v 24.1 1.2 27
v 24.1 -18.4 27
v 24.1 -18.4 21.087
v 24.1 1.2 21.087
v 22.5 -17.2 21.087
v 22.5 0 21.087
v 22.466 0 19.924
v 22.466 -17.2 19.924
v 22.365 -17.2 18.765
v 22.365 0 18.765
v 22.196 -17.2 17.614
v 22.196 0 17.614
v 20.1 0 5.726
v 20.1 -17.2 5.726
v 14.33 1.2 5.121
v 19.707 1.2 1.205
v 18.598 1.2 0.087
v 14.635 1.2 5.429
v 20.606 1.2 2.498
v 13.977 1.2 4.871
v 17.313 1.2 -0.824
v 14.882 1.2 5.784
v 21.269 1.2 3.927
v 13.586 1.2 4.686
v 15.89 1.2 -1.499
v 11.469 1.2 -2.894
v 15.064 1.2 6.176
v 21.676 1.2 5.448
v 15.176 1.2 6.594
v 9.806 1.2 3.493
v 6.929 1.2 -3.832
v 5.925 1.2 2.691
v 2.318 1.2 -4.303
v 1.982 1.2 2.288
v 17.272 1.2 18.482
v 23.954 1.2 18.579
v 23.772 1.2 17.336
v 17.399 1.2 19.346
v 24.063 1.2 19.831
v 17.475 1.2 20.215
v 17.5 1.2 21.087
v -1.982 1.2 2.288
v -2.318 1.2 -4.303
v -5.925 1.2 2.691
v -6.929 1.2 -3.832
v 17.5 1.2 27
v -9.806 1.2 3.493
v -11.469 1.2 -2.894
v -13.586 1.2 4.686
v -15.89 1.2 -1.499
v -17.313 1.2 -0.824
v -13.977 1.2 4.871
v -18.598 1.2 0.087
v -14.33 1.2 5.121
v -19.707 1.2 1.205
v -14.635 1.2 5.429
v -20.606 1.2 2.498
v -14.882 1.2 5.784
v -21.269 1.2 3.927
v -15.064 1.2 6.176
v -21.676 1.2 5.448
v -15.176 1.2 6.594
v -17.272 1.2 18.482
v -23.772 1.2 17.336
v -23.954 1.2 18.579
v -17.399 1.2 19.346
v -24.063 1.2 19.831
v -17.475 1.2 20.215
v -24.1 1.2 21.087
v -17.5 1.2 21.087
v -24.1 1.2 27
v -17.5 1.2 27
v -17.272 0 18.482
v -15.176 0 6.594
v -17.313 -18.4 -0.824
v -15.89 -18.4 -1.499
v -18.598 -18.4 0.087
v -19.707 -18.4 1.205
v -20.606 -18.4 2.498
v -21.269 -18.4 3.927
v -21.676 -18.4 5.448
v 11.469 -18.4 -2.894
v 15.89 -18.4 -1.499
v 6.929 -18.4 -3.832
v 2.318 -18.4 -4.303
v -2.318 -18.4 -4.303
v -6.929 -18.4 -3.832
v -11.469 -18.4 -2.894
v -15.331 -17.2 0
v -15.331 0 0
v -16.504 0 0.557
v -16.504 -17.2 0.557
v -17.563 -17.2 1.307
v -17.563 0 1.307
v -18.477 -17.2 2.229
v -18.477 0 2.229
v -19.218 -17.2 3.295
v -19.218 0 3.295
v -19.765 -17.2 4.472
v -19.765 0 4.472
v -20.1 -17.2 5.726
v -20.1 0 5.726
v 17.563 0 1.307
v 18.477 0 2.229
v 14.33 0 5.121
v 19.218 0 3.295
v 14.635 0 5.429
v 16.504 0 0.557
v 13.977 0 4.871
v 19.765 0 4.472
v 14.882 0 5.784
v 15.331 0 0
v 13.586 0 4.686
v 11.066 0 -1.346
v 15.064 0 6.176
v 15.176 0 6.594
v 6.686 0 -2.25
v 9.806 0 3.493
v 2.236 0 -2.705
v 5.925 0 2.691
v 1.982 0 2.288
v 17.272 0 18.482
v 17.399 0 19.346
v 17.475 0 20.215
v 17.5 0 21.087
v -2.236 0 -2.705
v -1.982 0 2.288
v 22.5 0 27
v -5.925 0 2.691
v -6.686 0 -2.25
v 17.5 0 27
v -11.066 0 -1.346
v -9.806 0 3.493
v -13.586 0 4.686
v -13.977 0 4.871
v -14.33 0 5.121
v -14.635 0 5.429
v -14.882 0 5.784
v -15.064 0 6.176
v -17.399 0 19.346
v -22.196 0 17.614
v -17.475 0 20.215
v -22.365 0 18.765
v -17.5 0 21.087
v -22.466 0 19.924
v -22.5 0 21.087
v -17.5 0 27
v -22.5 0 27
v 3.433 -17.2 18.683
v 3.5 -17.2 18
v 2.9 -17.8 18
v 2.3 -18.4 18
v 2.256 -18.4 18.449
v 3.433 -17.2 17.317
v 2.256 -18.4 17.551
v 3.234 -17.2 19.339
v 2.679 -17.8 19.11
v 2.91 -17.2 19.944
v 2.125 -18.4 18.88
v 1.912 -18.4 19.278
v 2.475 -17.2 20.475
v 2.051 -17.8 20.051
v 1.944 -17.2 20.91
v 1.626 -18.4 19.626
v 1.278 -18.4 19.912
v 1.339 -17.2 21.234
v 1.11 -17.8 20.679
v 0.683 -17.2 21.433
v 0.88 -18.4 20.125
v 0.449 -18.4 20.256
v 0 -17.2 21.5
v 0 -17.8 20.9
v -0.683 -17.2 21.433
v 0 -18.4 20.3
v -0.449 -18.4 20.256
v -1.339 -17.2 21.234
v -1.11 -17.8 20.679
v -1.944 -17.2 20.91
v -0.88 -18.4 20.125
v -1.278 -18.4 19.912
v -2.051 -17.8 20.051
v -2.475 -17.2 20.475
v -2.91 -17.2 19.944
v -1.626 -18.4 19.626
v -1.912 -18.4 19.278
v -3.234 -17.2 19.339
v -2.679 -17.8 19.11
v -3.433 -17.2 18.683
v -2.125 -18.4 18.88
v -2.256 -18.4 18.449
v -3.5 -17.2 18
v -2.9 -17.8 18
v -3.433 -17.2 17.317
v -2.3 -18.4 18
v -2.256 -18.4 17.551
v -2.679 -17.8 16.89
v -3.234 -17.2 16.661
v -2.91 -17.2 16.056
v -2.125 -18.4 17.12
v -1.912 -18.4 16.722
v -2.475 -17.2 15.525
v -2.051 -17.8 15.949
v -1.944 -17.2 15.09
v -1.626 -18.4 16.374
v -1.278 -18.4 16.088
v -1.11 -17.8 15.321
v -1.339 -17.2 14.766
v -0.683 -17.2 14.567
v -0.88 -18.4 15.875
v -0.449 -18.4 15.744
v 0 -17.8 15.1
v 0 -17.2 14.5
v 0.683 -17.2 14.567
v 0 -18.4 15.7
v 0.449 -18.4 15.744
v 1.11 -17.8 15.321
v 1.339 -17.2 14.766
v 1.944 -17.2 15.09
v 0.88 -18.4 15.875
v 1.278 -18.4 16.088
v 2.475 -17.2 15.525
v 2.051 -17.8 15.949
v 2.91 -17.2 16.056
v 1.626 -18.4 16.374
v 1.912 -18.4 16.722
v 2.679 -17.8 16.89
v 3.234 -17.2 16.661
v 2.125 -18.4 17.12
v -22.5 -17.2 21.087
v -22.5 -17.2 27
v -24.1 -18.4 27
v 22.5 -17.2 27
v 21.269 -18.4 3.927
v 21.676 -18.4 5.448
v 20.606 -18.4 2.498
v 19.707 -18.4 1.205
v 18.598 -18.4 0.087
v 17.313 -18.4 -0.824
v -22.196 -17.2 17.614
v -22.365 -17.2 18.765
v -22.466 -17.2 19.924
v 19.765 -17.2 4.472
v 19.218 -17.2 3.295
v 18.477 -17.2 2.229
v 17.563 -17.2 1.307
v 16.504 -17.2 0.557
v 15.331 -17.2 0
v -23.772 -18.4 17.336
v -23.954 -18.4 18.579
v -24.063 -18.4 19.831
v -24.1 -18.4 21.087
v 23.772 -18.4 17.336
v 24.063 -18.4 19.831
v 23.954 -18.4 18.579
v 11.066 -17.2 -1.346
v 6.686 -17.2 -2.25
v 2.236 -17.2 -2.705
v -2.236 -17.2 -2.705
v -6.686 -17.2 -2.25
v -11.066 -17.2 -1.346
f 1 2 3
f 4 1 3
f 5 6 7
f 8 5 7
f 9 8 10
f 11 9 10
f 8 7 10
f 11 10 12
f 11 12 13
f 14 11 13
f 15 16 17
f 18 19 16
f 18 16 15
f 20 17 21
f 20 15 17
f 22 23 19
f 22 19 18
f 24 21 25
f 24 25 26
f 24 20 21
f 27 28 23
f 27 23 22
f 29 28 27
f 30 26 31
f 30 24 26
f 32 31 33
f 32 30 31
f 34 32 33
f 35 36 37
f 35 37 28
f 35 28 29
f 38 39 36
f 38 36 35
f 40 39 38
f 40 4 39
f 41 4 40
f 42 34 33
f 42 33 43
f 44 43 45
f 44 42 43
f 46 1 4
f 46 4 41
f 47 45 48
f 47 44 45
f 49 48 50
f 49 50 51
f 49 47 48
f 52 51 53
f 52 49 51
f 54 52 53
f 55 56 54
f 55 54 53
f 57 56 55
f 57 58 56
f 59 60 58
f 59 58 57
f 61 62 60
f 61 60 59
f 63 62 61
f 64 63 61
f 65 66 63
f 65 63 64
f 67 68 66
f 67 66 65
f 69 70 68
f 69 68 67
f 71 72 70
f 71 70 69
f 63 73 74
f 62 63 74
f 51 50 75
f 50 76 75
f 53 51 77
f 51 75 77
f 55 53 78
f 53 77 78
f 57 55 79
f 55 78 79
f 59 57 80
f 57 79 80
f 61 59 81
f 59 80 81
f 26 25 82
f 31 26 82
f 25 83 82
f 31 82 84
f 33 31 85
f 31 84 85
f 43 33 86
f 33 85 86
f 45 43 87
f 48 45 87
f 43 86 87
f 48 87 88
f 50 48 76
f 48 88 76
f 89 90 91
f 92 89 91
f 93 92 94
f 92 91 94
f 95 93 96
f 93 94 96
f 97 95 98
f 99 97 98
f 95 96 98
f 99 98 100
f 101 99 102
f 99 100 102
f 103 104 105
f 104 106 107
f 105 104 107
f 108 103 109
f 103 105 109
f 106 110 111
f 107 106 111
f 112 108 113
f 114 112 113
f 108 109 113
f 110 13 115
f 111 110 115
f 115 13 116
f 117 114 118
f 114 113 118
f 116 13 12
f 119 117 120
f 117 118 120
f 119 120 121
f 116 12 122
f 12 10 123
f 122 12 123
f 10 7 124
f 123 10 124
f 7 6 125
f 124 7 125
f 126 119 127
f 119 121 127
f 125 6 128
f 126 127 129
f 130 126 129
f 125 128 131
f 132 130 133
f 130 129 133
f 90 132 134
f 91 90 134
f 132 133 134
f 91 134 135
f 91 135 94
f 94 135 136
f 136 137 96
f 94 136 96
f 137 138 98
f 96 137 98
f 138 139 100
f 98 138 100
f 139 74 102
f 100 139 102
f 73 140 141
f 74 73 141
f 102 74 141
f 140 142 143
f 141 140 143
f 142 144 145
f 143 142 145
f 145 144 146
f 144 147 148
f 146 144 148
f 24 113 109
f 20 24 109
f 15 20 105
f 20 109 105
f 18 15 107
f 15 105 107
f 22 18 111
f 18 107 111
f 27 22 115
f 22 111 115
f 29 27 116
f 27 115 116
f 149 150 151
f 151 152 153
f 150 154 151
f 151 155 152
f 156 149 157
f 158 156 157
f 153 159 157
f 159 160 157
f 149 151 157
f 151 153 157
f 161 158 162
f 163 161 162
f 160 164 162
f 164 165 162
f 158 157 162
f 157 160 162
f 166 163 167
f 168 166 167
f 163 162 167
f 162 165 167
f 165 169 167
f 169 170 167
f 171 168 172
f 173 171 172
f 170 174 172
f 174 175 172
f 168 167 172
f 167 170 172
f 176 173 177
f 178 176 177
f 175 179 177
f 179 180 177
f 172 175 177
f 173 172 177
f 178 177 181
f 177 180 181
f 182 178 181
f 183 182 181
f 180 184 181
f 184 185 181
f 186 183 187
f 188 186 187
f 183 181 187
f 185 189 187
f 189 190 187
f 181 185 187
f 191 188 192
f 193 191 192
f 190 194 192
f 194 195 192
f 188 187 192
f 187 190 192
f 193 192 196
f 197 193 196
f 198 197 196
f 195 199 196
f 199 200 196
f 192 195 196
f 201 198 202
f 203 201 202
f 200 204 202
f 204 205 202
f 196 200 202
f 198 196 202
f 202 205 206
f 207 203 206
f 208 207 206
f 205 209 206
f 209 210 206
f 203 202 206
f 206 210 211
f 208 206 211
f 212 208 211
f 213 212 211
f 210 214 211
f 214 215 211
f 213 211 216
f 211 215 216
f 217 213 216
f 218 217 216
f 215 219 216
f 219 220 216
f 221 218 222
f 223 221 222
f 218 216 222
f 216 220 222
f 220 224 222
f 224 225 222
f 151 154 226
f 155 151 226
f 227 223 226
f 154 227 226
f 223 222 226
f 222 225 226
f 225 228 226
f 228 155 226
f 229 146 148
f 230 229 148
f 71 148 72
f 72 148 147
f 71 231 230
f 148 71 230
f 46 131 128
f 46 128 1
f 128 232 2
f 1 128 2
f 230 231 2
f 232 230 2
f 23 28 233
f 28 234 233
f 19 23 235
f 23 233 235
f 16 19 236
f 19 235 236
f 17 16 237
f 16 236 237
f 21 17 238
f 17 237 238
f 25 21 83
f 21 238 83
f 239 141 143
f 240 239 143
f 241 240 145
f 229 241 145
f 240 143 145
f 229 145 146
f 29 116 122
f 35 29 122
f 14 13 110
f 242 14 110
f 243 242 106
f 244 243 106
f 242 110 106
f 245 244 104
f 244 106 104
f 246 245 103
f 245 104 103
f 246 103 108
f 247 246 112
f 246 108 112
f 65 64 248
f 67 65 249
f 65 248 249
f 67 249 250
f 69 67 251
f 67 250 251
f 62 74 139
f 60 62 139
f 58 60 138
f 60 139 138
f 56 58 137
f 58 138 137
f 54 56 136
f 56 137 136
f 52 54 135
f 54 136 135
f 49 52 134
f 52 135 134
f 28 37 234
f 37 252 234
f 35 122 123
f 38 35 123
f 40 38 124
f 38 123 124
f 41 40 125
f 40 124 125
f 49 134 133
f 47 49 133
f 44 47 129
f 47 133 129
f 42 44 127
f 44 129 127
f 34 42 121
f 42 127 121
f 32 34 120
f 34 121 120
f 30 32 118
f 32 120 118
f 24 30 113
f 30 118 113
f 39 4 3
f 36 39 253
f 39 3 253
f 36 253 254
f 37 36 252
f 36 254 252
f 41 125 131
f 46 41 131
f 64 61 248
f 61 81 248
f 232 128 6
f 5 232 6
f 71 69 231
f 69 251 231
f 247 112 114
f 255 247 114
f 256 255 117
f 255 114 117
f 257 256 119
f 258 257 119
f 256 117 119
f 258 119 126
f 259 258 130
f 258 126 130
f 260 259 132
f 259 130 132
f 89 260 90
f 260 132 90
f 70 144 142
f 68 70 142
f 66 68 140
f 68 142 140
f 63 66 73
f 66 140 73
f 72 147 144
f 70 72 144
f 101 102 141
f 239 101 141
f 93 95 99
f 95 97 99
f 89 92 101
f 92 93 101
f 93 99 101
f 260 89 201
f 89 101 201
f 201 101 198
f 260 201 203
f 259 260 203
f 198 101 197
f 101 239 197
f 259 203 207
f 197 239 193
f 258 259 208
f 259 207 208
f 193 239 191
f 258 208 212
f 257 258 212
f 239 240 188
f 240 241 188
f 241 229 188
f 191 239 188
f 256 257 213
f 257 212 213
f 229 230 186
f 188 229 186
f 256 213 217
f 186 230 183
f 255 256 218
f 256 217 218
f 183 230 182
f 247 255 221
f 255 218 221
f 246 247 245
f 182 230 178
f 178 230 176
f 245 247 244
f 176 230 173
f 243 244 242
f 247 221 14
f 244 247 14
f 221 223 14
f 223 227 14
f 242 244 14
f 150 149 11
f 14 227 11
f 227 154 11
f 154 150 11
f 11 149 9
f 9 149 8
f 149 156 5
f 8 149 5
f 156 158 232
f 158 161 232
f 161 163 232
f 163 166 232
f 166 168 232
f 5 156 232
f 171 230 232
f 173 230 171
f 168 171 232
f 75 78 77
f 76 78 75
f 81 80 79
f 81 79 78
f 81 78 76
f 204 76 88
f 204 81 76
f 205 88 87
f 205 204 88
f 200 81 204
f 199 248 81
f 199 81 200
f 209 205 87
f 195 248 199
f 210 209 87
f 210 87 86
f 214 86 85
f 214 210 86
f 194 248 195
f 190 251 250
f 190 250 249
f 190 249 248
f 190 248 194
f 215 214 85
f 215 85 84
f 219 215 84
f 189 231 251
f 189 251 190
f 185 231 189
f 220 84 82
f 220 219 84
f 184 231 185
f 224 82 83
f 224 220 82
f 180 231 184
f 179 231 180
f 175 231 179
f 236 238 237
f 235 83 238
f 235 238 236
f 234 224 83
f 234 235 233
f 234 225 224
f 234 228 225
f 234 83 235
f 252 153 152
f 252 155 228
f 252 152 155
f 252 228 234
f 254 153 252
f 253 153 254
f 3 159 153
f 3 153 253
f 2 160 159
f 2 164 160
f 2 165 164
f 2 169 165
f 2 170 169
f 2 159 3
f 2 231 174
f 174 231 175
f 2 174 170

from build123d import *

# Parameters (mm, degrees)
F1_DEPTH = 17.2
F2_R     = 1.5
F3_DEPTH = 1.2
F5_DEPTH = 1.2


# Not quite as in the source:
# - a fillet or chamfer that OpenCascade refuses, or shapes differently, is made with other operations: its cross-section is extruded or revolved along the edge and cut away or added


with BuildPart() as f1:
    # F0 (on Front) → F1 (new body)
    with BuildSketch(Plane.XZ):
        with BuildLine():
            Line((-20.1, 5.7260450742), (-22.1961550602, 17.6139311585))
            ThreePointArc((-22.1961550602, 17.6139311585), (-22.4238939618, 19.3437798569), (-22.5, 21.0868947118))
            Line((-22.5, 21.0868947118), (-22.5, 27))
            Line((-22.5, 27), (-24.1, 27))
            Line((-24.1, 27), (-24.1, 21.0868947118))
            ThreePointArc((-24.1, 21.0868947118), (-24.0178054788, 19.2043306685), (-23.7718474651, 17.3360940742))
            Line((-23.7718474651, 17.3360940742), (-21.6756924048, 5.44820799))
            ThreePointArc((-21.6756924048, 5.44820799), (-19.7066672631, 1.205023255), (-15.889887542, -1.4993933668))
            ThreePointArc((-15.889887542, -1.4993933668), (0, -4.3622248316), (15.889887542, -1.4993933668))
            ThreePointArc((15.889887542, -1.4993933668), (19.7066672631, 1.205023255), (21.6756924048, 5.44820799))
            Line((21.6756924048, 5.44820799), (23.7718474651, 17.3360940742))
            ThreePointArc((23.7718474651, 17.3360940742), (24.0178054788, 19.2043306685), (24.1, 21.0868947118))
            Line((24.1, 21.0868947118), (24.1, 27))
            Line((24.1, 27), (22.5, 27))
            Line((22.5, 27), (22.5, 21.0868947118))
            ThreePointArc((22.5, 21.0868947118), (22.4238939618, 19.3437798569), (22.1961550602, 17.6139311585))
            Line((22.1961550602, 17.6139311585), (20.1, 5.7260450742))
            ThreePointArc((20.1, 5.7260450742), (18.477177081, 2.2289147982), (15.3314795087, 0))
            ThreePointArc((15.3314795087, 0), (0, -2.7622248316), (-15.3314795087, 0))
            ThreePointArc((-15.3314795087, 0), (-18.477177081, 2.2289147982), (-20.1, 5.7260450742))
        make_face()
    extrude(amount=F1_DEPTH)

    # F2 (on face) → F3 (join)
    with BuildSketch(Plane.XZ.offset(17.2)):
        with BuildLine():
            Line((24.1, 27), (-24.1, 27))
            Line((-24.1, 27), (-24.1, 21.0868947118))
            ThreePointArc((-24.1, 21.0868947118), (-24.0178054788, 19.2043306685), (-23.7718474651, 17.3360940742))
            Line((-23.7718474651, 17.3360940742), (-21.6756924048, 5.44820799))
            ThreePointArc((-21.6756924048, 5.44820799), (-19.7066672631, 1.205023255), (-15.889887542, -1.4993933668))
            ThreePointArc((-15.889887542, -1.4993933668), (0, -4.3622248316), (15.889887542, -1.4993933668))
            ThreePointArc((15.889887542, -1.4993933668), (19.7066672631, 1.205023255), (21.6756924048, 5.44820799))
            Line((21.6756924048, 5.44820799), (23.7718474651, 17.3360940742))
            ThreePointArc((23.7718474651, 17.3360940742), (24.0178054788, 19.2043306685), (24.1, 21.0868947118))
            Line((24.1, 21.0868947118), (24.1, 27))
        make_face()
        with Locations((0, 18)):
            Circle(F2_R, mode=Mode.SUBTRACT)
    extrude(amount=F3_DEPTH)

    # F4 (on face) → F5 (join)
    with BuildSketch(Plane(origin=(0, 0, 0), x_dir=(-1, 0, 0), z_dir=(0, 1, 0))):
        with BuildLine():
            Line((-24.1, 27), (-24.1, 21.0868947118))
            ThreePointArc((-24.1, 21.0868947118), (-24.0178054788, 19.2043306685), (-23.7718474651, 17.3360940742))
            Line((-23.7718474651, 17.3360940742), (-21.6756924048, 5.44820799))
            ThreePointArc((-21.6756924048, 5.44820799), (-19.7066672631, 1.205023255), (-15.889887542, -1.4993933668))
            ThreePointArc((-15.889887542, -1.4993933668), (0, -4.3622248316), (15.889887542, -1.4993933668))
            ThreePointArc((15.889887542, -1.4993933668), (19.7066672631, 1.205023255), (21.6756924048, 5.44820799))
            Line((21.6756924048, 5.44820799), (23.7718474651, 17.3360940742))
            ThreePointArc((23.7718474651, 17.3360940742), (24.0178054788, 19.2043306685), (24.1, 21.0868947118))
            Line((24.1, 21.0868947118), (24.1, 27))
            Line((24.1, 27), (17.5, 27))
            Line((17.5, 27), (17.5, 21.0868947118))
            ThreePointArc((17.5, 21.0868947118), (17.4429204714, 19.7795585706), (17.2721162952, 18.4821720468))
            Line((17.2721162952, 18.4821720468), (15.1759612349, 6.5942859626))
            ThreePointArc((15.1759612349, 6.5942859626), (14.6350202619, 5.4285758705), (13.5864544045, 4.6856042711))
            ThreePointArc((13.5864544045, 4.6856042711), (0, 2.2377751684), (-13.5864544045, 4.6856042711))
            ThreePointArc((-13.5864544045, 4.6856042711), (-14.6350202619, 5.4285758705), (-15.1759612349, 6.5942859626))
            Line((-15.1759612349, 6.5942859626), (-17.2721162952, 18.4821720468))
            ThreePointArc((-17.2721162952, 18.4821720468), (-17.4429204714, 19.7795585706), (-17.5, 21.0868947118))
            Line((-17.5, 21.0868947118), (-17.5, 27))
            Line((-17.5, 27), (-24.1, 27))
        make_face()
    extrude(amount=F5_DEPTH)

    # F6: chamfer of 2 on 1 edges, made by hand

    # F6_s1 → F6_t2 (revolve, cut)
    with BuildSketch(Plane.XY.offset(18)):
        Polygon((3.5, -17.2), (1.5, -19.2), (1.5, -17.2), align=None)
    revolve(axis=Axis((0, -17.2, 18), (0, -1, 0)), mode=Mode.SUBTRACT)


solid = f1.part
